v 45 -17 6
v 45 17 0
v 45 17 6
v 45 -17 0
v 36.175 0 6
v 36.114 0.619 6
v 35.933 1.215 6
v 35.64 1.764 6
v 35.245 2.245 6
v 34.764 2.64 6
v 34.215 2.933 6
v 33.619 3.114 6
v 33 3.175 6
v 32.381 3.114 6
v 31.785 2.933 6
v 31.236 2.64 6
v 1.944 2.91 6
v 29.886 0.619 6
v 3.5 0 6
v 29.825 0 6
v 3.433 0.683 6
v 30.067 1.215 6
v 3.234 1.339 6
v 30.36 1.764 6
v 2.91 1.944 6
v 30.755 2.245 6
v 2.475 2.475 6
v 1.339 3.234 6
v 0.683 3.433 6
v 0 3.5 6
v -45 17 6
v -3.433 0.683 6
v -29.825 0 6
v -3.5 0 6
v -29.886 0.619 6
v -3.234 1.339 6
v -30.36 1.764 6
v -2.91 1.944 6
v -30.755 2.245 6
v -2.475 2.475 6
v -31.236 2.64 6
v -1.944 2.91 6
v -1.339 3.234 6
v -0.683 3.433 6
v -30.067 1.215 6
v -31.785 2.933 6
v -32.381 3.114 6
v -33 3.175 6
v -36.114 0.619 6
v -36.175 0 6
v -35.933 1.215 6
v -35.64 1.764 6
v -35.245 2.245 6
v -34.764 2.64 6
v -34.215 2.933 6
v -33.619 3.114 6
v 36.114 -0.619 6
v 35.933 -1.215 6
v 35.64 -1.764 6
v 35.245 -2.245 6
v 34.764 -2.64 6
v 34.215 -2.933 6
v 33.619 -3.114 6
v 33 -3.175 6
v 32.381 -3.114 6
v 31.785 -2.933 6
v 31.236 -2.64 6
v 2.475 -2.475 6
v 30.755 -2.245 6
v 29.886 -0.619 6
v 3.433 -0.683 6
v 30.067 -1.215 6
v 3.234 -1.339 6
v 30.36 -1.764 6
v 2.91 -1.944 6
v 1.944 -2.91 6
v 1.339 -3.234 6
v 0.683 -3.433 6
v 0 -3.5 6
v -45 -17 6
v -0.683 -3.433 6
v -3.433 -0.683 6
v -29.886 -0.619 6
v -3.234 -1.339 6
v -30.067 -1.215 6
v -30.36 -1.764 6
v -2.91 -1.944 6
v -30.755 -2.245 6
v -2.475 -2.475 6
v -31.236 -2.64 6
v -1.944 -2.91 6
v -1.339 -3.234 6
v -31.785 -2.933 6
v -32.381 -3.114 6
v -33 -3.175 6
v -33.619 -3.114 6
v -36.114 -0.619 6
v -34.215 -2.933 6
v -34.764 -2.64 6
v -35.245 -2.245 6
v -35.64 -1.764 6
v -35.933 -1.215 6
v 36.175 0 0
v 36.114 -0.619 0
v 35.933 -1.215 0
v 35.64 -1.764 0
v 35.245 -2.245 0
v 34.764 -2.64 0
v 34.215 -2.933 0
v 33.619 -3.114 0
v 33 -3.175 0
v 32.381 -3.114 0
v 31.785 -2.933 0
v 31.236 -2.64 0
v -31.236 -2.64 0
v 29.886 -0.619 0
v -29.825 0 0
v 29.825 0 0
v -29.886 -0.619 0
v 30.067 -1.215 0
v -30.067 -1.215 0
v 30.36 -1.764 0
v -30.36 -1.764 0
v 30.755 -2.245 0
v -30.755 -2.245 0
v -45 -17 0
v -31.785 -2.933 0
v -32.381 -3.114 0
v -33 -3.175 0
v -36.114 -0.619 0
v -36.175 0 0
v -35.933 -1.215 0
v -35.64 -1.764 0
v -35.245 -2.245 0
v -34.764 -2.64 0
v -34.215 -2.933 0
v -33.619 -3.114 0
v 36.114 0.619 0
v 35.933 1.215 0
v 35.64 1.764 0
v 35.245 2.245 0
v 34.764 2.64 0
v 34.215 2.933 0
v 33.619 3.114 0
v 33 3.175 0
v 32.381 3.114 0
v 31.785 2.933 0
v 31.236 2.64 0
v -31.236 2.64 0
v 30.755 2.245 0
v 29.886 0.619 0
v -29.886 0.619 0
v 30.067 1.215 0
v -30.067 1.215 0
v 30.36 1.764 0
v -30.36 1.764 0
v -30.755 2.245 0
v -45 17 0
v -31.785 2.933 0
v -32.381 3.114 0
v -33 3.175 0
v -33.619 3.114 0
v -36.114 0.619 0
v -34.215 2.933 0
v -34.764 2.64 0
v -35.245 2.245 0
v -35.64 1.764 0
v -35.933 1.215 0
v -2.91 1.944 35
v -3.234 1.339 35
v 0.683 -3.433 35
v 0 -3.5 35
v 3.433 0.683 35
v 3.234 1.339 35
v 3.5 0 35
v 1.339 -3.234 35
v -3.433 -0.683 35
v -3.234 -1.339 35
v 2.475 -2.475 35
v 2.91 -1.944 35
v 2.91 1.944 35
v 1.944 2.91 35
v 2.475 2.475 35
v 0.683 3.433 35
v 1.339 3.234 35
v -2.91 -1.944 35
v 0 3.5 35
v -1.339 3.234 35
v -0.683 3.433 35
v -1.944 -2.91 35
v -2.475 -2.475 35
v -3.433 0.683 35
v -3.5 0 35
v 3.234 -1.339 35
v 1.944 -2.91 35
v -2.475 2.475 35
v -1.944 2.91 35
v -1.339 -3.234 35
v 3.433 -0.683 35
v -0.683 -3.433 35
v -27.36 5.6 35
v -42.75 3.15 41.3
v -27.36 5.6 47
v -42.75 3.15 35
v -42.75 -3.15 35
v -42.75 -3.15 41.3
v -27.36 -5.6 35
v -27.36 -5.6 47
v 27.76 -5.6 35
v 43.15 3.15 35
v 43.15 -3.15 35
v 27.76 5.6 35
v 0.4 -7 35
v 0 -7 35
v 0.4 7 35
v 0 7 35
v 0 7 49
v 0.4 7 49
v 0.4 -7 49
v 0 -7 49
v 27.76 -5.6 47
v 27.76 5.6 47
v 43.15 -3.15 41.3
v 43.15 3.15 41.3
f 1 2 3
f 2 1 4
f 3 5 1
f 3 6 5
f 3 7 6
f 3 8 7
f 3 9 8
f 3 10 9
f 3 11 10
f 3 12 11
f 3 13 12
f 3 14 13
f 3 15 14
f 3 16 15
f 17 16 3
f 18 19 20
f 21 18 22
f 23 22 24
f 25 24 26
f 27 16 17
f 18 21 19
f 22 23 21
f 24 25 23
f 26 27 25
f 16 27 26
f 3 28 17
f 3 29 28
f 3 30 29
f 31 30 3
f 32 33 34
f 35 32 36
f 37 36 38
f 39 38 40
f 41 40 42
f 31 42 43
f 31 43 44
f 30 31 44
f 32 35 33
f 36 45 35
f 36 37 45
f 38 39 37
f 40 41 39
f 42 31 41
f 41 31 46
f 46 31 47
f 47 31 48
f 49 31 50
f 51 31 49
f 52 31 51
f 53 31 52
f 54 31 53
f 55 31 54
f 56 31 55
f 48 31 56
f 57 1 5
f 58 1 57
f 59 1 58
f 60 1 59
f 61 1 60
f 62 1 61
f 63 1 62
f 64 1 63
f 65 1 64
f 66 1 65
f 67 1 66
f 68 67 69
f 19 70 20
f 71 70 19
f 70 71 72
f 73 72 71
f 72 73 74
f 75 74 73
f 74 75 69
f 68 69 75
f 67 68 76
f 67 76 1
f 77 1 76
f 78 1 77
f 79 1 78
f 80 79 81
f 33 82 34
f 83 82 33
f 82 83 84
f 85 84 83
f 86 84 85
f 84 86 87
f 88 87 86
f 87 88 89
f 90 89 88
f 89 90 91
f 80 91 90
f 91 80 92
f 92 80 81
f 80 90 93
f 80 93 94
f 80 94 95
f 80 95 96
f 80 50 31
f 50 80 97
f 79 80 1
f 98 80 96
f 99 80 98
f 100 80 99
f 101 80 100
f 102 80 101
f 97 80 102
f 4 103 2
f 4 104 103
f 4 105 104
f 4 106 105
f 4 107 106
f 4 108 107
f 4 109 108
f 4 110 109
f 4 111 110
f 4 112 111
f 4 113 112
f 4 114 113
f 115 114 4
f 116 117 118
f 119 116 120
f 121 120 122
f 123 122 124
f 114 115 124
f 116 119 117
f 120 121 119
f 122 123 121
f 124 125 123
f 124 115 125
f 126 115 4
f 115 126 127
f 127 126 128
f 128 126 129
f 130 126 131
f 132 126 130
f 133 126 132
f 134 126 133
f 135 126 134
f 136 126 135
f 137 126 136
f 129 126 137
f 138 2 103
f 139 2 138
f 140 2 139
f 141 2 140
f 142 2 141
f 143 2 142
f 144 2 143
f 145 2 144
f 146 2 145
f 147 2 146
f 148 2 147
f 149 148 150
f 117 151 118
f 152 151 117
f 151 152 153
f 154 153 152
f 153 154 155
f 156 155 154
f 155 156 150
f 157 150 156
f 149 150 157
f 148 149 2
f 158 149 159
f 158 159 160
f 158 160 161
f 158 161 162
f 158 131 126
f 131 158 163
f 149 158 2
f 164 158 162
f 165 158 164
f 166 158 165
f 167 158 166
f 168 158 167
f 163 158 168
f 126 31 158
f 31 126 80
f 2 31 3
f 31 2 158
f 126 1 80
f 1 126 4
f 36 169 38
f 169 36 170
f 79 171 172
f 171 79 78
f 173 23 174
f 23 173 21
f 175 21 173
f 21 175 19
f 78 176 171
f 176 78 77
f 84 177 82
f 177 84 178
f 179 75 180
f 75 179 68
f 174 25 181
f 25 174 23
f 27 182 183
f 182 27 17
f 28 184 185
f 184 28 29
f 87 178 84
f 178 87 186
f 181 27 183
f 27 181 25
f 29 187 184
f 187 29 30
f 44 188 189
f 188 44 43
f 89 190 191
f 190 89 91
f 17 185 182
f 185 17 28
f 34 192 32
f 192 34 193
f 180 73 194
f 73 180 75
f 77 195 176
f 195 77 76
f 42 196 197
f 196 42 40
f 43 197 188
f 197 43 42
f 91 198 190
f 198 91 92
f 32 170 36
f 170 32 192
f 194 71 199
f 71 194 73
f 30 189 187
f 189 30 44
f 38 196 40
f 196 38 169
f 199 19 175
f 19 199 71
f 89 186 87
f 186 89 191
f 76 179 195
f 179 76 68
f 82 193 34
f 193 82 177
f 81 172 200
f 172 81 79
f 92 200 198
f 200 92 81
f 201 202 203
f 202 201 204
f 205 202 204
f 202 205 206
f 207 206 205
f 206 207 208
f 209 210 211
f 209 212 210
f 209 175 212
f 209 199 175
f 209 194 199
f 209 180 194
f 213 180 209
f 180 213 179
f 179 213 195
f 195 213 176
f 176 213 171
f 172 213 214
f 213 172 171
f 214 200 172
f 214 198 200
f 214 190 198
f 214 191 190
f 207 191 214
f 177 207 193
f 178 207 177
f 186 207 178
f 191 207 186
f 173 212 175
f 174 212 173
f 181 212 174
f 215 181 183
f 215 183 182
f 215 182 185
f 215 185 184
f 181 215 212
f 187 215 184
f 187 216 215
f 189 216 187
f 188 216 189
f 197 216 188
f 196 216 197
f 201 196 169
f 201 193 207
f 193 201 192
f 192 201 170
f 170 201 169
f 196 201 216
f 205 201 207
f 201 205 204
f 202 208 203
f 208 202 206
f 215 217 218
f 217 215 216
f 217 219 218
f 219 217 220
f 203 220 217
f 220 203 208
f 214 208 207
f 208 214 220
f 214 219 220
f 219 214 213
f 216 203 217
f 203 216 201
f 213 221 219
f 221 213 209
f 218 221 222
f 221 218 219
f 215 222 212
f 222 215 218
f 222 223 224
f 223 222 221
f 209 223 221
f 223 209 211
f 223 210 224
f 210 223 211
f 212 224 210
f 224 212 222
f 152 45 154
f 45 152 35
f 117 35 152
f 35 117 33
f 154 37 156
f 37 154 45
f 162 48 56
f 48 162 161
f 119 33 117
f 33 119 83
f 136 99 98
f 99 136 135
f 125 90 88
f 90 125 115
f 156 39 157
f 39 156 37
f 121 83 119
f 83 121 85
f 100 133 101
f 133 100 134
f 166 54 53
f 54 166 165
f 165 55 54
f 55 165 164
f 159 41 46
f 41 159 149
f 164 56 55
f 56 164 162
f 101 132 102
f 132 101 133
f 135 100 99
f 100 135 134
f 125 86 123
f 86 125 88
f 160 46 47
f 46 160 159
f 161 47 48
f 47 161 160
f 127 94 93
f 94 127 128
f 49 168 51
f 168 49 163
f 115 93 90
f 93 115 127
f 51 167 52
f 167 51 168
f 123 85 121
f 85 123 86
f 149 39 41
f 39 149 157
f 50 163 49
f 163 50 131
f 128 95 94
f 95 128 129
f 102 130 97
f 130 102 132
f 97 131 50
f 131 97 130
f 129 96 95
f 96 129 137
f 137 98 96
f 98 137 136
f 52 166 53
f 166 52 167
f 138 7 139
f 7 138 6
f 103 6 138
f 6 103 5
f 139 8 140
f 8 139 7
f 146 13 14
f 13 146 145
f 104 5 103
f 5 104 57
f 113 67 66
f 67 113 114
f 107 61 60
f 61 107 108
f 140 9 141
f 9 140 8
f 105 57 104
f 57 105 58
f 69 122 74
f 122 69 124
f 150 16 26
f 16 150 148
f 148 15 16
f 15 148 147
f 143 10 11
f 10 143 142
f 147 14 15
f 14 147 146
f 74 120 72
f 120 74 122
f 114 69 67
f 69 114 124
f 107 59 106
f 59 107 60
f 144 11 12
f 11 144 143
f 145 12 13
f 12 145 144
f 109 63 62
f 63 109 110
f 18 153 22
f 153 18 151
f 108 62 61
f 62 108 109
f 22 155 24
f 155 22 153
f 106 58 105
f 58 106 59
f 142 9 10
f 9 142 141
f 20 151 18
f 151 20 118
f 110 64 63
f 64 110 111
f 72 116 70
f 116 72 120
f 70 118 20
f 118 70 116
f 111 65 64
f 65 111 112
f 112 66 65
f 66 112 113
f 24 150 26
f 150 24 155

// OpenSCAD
$fn = 32;

// ----------------------------------------------------------------------
// Boat cleat: 90 mm base, horn 42 mm up
// ----------------------------------------------------------------------

// --- parameters (mm) ---
base_l = 90;              // base length
base_w = 34;              // base width
base_t = 6;               // base thickness
horn_len = 85.5;          // horn length
horn_d = 14;              // horn diameter at the middle
horn_z = 42;              // horn axis height
end_drop = 8;             // how far the horn tips drop
post_d = 7;               // centre post diameter
holes_d = 6.35;           // fixing holes
hole_x = 33;              // fixing hole spacing

difference() {
  union() {
    translate([-45, -17, 0]) cube([base_l, base_w, base_t]);
    /* centre post, sunk 1 mm into the base */
    translate([0, 0, 5]) cylinder(h = 37, d = post_d);
    /* horn: a hull chain of boxes, full in the middle and lighter at the tips */
    hull() {
      translate([-42.75, -3.15, 35]) cube([0.4, 6.3, 6.3], center = false);
      translate([-27.36, -5.6, 35]) cube([0.4, 11.2, 12], center = false);
    }
    hull() {
      translate([-27.36, -5.6, 35]) cube([0.4, 11.2, 12], center = false);
      translate([0, -7, 35]) cube([0.4, 14, 14], center = false);
    }
    hull() {
      translate([0, -7, 35]) cube([0.4, 14, 14], center = false);
      translate([27.36, -5.6, 35]) cube([0.4, 11.2, 12], center = false);
    }
    hull() {
      translate([27.36, -5.6, 35]) cube([0.4, 11.2, 12], center = false);
      translate([42.75, -3.15, 35]) cube([0.4, 6.3, 6.3], center = false);
    }
  }
  translate([-33, 0, -2.5]) cylinder(h = base_t + 5, d = holes_d);
  translate([33, 0, -2.5]) cylinder(h = base_t + 5, d = holes_d);
}
